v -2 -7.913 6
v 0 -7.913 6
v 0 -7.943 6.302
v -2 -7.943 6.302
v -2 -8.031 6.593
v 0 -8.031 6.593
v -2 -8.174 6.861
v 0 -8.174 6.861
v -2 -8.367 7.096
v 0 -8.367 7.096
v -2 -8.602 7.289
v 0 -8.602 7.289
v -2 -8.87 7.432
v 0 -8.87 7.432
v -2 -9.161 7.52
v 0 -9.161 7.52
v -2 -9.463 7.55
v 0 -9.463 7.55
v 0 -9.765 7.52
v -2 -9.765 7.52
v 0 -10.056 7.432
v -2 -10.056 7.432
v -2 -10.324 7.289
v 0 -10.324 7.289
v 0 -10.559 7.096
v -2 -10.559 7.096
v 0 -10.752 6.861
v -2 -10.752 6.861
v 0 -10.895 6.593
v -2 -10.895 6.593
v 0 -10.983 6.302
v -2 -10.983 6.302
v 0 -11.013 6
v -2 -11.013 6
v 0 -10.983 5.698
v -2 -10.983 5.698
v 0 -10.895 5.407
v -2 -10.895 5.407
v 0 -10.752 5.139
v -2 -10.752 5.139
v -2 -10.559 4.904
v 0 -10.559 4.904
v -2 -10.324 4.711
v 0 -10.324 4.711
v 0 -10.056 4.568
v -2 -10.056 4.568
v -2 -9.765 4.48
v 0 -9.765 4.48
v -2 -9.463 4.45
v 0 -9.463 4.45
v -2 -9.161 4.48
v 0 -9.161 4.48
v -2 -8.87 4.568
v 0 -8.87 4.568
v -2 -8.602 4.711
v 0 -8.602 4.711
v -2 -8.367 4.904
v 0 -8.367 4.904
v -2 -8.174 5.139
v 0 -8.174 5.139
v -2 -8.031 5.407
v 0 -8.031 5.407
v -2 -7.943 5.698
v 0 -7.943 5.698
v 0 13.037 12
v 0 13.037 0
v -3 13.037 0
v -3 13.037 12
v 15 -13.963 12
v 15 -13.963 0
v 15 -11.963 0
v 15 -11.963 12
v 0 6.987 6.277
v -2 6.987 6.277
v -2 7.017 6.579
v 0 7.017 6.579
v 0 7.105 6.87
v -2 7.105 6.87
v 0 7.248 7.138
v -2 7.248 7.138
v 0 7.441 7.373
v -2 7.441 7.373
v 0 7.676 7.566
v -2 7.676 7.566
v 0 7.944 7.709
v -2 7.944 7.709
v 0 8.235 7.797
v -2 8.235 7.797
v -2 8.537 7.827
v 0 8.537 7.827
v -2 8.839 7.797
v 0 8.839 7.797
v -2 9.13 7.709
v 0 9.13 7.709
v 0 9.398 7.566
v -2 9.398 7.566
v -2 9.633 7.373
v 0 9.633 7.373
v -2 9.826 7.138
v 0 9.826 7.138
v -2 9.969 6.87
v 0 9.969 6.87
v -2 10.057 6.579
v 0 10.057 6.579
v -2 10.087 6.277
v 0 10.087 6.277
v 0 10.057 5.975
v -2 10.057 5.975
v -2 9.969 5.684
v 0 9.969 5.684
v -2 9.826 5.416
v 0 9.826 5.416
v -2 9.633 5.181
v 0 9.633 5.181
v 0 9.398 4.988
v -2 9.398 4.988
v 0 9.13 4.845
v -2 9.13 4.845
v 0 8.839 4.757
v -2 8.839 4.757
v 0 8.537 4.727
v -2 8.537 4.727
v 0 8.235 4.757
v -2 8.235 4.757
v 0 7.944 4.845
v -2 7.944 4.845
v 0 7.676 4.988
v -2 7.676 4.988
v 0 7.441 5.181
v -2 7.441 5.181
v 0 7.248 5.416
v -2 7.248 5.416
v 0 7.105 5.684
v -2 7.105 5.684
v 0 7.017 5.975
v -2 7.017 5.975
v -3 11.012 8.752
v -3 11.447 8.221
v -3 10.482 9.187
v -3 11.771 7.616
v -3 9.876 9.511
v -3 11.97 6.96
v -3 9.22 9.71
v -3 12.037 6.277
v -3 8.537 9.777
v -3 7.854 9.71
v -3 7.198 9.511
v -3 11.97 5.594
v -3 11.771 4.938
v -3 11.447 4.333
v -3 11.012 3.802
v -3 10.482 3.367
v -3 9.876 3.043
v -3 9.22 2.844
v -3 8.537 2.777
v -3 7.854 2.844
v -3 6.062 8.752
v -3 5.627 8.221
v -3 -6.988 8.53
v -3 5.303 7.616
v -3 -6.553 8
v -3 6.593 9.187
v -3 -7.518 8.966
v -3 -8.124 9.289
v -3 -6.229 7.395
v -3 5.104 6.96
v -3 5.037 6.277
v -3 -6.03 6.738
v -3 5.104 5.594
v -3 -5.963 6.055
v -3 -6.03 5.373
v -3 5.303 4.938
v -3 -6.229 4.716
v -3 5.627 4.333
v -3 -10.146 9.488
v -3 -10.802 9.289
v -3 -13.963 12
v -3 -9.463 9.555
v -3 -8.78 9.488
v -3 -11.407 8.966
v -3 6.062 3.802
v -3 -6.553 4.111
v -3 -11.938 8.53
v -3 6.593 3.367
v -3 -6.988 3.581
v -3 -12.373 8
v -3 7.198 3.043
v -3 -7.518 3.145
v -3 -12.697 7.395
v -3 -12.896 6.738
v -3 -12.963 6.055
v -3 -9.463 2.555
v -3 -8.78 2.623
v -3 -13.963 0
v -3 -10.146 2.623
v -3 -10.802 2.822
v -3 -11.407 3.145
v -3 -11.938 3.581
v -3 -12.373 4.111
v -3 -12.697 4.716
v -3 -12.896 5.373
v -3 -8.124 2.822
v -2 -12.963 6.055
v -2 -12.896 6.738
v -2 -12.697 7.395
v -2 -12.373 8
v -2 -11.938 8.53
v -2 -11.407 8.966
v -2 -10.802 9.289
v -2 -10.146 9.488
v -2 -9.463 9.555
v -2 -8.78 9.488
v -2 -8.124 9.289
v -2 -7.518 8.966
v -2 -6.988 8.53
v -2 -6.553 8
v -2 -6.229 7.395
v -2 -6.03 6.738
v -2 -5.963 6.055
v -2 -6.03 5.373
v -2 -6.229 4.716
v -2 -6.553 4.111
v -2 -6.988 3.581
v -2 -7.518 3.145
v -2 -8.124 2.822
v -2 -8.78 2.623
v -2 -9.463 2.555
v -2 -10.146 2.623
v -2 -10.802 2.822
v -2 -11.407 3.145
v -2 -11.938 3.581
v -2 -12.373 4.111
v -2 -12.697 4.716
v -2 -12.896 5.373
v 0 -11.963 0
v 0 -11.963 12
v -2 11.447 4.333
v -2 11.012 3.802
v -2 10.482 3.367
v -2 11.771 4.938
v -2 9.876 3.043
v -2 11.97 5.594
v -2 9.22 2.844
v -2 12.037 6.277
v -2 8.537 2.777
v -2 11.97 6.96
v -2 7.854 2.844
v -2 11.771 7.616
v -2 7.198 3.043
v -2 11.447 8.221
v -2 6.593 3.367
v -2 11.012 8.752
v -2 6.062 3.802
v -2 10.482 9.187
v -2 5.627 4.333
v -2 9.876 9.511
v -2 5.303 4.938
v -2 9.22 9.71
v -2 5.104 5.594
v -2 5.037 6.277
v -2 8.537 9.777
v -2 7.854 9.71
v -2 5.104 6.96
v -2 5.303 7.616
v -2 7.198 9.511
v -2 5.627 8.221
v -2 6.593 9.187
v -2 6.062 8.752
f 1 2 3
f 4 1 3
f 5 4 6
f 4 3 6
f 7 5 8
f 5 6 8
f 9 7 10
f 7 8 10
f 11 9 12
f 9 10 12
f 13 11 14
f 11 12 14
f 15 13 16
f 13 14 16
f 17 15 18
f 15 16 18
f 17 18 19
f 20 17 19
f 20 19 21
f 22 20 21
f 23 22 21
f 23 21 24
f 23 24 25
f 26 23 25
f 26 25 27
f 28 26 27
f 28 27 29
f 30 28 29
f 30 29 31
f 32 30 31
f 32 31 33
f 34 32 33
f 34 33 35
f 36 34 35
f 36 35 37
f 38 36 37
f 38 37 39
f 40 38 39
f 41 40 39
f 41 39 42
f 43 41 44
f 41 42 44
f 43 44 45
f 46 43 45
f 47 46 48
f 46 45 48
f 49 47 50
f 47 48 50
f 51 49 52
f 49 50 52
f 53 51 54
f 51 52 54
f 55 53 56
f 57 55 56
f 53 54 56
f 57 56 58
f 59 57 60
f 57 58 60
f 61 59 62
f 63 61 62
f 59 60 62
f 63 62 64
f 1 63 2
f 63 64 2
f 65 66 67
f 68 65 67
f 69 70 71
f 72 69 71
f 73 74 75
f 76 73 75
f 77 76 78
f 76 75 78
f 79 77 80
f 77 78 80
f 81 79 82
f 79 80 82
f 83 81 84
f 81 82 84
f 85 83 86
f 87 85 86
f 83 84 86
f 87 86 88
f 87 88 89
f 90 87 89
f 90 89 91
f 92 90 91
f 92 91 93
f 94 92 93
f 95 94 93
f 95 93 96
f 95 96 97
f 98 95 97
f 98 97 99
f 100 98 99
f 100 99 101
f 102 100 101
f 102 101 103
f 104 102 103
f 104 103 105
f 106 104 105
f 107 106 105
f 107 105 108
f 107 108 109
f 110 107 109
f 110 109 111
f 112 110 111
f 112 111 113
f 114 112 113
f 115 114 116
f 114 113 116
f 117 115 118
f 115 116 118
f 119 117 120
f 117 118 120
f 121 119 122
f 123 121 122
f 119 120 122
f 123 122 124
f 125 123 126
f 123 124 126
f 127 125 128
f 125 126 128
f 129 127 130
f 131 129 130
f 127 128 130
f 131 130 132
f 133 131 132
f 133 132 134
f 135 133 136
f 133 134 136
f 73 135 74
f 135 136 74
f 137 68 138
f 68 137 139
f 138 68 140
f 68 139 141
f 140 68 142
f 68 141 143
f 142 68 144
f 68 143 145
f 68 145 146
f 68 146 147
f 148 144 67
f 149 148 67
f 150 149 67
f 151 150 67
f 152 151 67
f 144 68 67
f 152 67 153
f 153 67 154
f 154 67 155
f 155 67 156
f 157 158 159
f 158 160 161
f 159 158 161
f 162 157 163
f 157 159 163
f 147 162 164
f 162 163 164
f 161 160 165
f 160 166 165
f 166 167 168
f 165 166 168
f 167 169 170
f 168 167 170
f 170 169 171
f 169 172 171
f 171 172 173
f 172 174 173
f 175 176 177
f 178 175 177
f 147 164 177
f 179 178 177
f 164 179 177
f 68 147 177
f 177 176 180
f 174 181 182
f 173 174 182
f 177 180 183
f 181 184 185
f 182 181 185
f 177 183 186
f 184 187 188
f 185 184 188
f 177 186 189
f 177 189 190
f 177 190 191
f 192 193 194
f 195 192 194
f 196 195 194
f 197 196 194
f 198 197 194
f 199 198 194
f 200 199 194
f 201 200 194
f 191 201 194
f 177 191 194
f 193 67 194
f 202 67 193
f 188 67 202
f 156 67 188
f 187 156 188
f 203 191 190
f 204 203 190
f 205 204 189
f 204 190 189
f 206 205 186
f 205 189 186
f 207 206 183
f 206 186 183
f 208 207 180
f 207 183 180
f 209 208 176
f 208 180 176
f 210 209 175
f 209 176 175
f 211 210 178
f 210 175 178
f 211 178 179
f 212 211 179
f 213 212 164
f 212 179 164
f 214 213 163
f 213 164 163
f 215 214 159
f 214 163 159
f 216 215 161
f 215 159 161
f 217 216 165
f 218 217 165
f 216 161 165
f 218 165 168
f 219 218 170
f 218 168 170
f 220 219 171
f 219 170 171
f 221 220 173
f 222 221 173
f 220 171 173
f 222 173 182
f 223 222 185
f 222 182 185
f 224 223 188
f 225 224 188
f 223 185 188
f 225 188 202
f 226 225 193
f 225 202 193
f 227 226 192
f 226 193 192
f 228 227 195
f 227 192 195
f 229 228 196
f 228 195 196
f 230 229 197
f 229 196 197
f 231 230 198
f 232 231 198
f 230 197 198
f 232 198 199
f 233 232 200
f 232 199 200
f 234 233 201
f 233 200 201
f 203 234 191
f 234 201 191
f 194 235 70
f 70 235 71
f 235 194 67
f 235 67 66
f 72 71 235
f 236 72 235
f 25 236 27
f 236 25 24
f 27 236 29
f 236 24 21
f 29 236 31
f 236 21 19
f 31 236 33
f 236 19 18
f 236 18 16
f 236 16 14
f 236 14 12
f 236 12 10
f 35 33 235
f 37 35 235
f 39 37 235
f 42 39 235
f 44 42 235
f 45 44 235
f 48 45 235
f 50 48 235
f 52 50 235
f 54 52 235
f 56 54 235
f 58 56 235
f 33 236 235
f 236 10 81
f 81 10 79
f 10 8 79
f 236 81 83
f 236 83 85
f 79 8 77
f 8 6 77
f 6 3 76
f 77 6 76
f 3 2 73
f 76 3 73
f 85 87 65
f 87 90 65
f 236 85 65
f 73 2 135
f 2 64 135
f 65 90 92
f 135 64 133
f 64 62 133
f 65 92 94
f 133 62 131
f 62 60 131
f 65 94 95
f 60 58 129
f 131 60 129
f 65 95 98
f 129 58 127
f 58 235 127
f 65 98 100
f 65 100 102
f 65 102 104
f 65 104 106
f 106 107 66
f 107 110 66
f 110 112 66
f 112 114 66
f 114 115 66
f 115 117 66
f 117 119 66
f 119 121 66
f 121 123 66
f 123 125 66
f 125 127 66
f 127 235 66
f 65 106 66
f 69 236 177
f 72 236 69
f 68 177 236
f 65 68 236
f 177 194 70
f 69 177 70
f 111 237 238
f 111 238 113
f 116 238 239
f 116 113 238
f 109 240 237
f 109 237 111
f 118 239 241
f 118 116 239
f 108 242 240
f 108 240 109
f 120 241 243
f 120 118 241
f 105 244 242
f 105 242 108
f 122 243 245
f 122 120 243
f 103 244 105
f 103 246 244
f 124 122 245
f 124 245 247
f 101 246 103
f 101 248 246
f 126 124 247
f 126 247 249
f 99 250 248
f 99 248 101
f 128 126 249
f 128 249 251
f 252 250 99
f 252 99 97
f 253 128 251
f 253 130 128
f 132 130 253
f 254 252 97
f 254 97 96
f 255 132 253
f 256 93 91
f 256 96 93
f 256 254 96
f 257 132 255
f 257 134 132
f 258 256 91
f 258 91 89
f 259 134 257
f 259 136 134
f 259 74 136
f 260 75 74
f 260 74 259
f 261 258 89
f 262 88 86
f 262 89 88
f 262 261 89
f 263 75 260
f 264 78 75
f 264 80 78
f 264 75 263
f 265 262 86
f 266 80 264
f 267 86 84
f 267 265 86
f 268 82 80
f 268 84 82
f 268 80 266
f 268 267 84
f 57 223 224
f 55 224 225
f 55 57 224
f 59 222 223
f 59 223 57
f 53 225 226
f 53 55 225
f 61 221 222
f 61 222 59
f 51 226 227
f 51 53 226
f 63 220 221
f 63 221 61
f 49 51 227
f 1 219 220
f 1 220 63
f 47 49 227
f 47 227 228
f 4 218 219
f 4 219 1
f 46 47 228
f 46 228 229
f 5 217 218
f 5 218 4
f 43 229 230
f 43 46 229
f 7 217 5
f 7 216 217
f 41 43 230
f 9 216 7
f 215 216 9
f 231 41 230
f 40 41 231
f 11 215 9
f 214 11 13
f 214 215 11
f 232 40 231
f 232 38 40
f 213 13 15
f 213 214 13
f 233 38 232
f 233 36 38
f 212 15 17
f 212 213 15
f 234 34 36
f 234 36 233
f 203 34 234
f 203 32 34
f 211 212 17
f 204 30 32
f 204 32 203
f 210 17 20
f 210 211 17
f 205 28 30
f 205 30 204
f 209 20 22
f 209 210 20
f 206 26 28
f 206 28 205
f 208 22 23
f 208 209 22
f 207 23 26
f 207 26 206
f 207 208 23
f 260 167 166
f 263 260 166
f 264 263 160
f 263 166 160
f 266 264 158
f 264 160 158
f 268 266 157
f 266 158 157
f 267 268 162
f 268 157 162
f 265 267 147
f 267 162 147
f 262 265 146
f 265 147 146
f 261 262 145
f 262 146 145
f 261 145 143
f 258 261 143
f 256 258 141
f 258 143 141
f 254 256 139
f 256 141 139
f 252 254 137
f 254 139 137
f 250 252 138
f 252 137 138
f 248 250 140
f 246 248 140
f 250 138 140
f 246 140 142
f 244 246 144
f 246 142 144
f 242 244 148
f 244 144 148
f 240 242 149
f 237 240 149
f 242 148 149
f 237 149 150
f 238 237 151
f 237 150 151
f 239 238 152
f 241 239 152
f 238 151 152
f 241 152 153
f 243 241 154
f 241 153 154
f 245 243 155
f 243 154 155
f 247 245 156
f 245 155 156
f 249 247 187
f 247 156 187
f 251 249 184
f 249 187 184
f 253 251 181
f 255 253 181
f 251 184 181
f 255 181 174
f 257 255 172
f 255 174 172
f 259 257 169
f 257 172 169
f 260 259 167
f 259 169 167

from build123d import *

# Parameters (mm, degrees)
BOSS_EXTRUDE1_DEPTH = 12
SKETCH2_R           = 3.5
CUT_EXTRUDE1_DEPTH  = 1
SKETCH3_R           = 1.55
CUT_EXTRUDE2_DEPTH  = 3.1
SKETCH5_R           = 1.55
CUT_EXTRUDE3_DEPTH  = 11


with BuildPart() as part:
    # Sketch1 → Boss-Extrude1 (new body)
    with BuildSketch(Plane.XY):
        Polygon((0, 13.037037037), (-3, 13.037037037), (-3, -13.962962963), (15, -13.962962963), (15, -11.962962963), (0, -11.962962963), align=None)
    extrude(amount=BOSS_EXTRUDE1_DEPTH)

    # Sketch2 → Cut-Extrude1 (cut)
    with BuildSketch(Plane.ZY.offset(3)):
        with Locations(Location((6.055399975, -9.462962963, 0), (0, 0, 270))):
            Circle(SKETCH2_R)
        with Locations(Location((6.276999876, 8.537037037, 0), (0, 0, 270))):
            Circle(SKETCH2_R)
    extrude(amount=-CUT_EXTRUDE1_DEPTH, mode=Mode.SUBTRACT)

    # Sketch3 → Cut-Extrude2 (cut)
    with BuildSketch(Plane.ZY.offset(3)):
        with Locations(Location((6.276999876, 8.537037037, 0), (0, 0, 270))):
            Circle(SKETCH3_R)
    extrude(amount=-CUT_EXTRUDE2_DEPTH, mode=Mode.SUBTRACT)

    # Sketch5 → Cut-Extrude3 (cut)
    with BuildSketch(Plane(origin=(0, 0, 0), x_dir=(0, 0, -1), z_dir=(1, 0, 0))):
        with Locations(Location((-6, -9.462962963, 0), (0, 0, 90))):
            Circle(SKETCH5_R)
    extrude(amount=-CUT_EXTRUDE3_DEPTH, mode=Mode.SUBTRACT)


solid = part.part
